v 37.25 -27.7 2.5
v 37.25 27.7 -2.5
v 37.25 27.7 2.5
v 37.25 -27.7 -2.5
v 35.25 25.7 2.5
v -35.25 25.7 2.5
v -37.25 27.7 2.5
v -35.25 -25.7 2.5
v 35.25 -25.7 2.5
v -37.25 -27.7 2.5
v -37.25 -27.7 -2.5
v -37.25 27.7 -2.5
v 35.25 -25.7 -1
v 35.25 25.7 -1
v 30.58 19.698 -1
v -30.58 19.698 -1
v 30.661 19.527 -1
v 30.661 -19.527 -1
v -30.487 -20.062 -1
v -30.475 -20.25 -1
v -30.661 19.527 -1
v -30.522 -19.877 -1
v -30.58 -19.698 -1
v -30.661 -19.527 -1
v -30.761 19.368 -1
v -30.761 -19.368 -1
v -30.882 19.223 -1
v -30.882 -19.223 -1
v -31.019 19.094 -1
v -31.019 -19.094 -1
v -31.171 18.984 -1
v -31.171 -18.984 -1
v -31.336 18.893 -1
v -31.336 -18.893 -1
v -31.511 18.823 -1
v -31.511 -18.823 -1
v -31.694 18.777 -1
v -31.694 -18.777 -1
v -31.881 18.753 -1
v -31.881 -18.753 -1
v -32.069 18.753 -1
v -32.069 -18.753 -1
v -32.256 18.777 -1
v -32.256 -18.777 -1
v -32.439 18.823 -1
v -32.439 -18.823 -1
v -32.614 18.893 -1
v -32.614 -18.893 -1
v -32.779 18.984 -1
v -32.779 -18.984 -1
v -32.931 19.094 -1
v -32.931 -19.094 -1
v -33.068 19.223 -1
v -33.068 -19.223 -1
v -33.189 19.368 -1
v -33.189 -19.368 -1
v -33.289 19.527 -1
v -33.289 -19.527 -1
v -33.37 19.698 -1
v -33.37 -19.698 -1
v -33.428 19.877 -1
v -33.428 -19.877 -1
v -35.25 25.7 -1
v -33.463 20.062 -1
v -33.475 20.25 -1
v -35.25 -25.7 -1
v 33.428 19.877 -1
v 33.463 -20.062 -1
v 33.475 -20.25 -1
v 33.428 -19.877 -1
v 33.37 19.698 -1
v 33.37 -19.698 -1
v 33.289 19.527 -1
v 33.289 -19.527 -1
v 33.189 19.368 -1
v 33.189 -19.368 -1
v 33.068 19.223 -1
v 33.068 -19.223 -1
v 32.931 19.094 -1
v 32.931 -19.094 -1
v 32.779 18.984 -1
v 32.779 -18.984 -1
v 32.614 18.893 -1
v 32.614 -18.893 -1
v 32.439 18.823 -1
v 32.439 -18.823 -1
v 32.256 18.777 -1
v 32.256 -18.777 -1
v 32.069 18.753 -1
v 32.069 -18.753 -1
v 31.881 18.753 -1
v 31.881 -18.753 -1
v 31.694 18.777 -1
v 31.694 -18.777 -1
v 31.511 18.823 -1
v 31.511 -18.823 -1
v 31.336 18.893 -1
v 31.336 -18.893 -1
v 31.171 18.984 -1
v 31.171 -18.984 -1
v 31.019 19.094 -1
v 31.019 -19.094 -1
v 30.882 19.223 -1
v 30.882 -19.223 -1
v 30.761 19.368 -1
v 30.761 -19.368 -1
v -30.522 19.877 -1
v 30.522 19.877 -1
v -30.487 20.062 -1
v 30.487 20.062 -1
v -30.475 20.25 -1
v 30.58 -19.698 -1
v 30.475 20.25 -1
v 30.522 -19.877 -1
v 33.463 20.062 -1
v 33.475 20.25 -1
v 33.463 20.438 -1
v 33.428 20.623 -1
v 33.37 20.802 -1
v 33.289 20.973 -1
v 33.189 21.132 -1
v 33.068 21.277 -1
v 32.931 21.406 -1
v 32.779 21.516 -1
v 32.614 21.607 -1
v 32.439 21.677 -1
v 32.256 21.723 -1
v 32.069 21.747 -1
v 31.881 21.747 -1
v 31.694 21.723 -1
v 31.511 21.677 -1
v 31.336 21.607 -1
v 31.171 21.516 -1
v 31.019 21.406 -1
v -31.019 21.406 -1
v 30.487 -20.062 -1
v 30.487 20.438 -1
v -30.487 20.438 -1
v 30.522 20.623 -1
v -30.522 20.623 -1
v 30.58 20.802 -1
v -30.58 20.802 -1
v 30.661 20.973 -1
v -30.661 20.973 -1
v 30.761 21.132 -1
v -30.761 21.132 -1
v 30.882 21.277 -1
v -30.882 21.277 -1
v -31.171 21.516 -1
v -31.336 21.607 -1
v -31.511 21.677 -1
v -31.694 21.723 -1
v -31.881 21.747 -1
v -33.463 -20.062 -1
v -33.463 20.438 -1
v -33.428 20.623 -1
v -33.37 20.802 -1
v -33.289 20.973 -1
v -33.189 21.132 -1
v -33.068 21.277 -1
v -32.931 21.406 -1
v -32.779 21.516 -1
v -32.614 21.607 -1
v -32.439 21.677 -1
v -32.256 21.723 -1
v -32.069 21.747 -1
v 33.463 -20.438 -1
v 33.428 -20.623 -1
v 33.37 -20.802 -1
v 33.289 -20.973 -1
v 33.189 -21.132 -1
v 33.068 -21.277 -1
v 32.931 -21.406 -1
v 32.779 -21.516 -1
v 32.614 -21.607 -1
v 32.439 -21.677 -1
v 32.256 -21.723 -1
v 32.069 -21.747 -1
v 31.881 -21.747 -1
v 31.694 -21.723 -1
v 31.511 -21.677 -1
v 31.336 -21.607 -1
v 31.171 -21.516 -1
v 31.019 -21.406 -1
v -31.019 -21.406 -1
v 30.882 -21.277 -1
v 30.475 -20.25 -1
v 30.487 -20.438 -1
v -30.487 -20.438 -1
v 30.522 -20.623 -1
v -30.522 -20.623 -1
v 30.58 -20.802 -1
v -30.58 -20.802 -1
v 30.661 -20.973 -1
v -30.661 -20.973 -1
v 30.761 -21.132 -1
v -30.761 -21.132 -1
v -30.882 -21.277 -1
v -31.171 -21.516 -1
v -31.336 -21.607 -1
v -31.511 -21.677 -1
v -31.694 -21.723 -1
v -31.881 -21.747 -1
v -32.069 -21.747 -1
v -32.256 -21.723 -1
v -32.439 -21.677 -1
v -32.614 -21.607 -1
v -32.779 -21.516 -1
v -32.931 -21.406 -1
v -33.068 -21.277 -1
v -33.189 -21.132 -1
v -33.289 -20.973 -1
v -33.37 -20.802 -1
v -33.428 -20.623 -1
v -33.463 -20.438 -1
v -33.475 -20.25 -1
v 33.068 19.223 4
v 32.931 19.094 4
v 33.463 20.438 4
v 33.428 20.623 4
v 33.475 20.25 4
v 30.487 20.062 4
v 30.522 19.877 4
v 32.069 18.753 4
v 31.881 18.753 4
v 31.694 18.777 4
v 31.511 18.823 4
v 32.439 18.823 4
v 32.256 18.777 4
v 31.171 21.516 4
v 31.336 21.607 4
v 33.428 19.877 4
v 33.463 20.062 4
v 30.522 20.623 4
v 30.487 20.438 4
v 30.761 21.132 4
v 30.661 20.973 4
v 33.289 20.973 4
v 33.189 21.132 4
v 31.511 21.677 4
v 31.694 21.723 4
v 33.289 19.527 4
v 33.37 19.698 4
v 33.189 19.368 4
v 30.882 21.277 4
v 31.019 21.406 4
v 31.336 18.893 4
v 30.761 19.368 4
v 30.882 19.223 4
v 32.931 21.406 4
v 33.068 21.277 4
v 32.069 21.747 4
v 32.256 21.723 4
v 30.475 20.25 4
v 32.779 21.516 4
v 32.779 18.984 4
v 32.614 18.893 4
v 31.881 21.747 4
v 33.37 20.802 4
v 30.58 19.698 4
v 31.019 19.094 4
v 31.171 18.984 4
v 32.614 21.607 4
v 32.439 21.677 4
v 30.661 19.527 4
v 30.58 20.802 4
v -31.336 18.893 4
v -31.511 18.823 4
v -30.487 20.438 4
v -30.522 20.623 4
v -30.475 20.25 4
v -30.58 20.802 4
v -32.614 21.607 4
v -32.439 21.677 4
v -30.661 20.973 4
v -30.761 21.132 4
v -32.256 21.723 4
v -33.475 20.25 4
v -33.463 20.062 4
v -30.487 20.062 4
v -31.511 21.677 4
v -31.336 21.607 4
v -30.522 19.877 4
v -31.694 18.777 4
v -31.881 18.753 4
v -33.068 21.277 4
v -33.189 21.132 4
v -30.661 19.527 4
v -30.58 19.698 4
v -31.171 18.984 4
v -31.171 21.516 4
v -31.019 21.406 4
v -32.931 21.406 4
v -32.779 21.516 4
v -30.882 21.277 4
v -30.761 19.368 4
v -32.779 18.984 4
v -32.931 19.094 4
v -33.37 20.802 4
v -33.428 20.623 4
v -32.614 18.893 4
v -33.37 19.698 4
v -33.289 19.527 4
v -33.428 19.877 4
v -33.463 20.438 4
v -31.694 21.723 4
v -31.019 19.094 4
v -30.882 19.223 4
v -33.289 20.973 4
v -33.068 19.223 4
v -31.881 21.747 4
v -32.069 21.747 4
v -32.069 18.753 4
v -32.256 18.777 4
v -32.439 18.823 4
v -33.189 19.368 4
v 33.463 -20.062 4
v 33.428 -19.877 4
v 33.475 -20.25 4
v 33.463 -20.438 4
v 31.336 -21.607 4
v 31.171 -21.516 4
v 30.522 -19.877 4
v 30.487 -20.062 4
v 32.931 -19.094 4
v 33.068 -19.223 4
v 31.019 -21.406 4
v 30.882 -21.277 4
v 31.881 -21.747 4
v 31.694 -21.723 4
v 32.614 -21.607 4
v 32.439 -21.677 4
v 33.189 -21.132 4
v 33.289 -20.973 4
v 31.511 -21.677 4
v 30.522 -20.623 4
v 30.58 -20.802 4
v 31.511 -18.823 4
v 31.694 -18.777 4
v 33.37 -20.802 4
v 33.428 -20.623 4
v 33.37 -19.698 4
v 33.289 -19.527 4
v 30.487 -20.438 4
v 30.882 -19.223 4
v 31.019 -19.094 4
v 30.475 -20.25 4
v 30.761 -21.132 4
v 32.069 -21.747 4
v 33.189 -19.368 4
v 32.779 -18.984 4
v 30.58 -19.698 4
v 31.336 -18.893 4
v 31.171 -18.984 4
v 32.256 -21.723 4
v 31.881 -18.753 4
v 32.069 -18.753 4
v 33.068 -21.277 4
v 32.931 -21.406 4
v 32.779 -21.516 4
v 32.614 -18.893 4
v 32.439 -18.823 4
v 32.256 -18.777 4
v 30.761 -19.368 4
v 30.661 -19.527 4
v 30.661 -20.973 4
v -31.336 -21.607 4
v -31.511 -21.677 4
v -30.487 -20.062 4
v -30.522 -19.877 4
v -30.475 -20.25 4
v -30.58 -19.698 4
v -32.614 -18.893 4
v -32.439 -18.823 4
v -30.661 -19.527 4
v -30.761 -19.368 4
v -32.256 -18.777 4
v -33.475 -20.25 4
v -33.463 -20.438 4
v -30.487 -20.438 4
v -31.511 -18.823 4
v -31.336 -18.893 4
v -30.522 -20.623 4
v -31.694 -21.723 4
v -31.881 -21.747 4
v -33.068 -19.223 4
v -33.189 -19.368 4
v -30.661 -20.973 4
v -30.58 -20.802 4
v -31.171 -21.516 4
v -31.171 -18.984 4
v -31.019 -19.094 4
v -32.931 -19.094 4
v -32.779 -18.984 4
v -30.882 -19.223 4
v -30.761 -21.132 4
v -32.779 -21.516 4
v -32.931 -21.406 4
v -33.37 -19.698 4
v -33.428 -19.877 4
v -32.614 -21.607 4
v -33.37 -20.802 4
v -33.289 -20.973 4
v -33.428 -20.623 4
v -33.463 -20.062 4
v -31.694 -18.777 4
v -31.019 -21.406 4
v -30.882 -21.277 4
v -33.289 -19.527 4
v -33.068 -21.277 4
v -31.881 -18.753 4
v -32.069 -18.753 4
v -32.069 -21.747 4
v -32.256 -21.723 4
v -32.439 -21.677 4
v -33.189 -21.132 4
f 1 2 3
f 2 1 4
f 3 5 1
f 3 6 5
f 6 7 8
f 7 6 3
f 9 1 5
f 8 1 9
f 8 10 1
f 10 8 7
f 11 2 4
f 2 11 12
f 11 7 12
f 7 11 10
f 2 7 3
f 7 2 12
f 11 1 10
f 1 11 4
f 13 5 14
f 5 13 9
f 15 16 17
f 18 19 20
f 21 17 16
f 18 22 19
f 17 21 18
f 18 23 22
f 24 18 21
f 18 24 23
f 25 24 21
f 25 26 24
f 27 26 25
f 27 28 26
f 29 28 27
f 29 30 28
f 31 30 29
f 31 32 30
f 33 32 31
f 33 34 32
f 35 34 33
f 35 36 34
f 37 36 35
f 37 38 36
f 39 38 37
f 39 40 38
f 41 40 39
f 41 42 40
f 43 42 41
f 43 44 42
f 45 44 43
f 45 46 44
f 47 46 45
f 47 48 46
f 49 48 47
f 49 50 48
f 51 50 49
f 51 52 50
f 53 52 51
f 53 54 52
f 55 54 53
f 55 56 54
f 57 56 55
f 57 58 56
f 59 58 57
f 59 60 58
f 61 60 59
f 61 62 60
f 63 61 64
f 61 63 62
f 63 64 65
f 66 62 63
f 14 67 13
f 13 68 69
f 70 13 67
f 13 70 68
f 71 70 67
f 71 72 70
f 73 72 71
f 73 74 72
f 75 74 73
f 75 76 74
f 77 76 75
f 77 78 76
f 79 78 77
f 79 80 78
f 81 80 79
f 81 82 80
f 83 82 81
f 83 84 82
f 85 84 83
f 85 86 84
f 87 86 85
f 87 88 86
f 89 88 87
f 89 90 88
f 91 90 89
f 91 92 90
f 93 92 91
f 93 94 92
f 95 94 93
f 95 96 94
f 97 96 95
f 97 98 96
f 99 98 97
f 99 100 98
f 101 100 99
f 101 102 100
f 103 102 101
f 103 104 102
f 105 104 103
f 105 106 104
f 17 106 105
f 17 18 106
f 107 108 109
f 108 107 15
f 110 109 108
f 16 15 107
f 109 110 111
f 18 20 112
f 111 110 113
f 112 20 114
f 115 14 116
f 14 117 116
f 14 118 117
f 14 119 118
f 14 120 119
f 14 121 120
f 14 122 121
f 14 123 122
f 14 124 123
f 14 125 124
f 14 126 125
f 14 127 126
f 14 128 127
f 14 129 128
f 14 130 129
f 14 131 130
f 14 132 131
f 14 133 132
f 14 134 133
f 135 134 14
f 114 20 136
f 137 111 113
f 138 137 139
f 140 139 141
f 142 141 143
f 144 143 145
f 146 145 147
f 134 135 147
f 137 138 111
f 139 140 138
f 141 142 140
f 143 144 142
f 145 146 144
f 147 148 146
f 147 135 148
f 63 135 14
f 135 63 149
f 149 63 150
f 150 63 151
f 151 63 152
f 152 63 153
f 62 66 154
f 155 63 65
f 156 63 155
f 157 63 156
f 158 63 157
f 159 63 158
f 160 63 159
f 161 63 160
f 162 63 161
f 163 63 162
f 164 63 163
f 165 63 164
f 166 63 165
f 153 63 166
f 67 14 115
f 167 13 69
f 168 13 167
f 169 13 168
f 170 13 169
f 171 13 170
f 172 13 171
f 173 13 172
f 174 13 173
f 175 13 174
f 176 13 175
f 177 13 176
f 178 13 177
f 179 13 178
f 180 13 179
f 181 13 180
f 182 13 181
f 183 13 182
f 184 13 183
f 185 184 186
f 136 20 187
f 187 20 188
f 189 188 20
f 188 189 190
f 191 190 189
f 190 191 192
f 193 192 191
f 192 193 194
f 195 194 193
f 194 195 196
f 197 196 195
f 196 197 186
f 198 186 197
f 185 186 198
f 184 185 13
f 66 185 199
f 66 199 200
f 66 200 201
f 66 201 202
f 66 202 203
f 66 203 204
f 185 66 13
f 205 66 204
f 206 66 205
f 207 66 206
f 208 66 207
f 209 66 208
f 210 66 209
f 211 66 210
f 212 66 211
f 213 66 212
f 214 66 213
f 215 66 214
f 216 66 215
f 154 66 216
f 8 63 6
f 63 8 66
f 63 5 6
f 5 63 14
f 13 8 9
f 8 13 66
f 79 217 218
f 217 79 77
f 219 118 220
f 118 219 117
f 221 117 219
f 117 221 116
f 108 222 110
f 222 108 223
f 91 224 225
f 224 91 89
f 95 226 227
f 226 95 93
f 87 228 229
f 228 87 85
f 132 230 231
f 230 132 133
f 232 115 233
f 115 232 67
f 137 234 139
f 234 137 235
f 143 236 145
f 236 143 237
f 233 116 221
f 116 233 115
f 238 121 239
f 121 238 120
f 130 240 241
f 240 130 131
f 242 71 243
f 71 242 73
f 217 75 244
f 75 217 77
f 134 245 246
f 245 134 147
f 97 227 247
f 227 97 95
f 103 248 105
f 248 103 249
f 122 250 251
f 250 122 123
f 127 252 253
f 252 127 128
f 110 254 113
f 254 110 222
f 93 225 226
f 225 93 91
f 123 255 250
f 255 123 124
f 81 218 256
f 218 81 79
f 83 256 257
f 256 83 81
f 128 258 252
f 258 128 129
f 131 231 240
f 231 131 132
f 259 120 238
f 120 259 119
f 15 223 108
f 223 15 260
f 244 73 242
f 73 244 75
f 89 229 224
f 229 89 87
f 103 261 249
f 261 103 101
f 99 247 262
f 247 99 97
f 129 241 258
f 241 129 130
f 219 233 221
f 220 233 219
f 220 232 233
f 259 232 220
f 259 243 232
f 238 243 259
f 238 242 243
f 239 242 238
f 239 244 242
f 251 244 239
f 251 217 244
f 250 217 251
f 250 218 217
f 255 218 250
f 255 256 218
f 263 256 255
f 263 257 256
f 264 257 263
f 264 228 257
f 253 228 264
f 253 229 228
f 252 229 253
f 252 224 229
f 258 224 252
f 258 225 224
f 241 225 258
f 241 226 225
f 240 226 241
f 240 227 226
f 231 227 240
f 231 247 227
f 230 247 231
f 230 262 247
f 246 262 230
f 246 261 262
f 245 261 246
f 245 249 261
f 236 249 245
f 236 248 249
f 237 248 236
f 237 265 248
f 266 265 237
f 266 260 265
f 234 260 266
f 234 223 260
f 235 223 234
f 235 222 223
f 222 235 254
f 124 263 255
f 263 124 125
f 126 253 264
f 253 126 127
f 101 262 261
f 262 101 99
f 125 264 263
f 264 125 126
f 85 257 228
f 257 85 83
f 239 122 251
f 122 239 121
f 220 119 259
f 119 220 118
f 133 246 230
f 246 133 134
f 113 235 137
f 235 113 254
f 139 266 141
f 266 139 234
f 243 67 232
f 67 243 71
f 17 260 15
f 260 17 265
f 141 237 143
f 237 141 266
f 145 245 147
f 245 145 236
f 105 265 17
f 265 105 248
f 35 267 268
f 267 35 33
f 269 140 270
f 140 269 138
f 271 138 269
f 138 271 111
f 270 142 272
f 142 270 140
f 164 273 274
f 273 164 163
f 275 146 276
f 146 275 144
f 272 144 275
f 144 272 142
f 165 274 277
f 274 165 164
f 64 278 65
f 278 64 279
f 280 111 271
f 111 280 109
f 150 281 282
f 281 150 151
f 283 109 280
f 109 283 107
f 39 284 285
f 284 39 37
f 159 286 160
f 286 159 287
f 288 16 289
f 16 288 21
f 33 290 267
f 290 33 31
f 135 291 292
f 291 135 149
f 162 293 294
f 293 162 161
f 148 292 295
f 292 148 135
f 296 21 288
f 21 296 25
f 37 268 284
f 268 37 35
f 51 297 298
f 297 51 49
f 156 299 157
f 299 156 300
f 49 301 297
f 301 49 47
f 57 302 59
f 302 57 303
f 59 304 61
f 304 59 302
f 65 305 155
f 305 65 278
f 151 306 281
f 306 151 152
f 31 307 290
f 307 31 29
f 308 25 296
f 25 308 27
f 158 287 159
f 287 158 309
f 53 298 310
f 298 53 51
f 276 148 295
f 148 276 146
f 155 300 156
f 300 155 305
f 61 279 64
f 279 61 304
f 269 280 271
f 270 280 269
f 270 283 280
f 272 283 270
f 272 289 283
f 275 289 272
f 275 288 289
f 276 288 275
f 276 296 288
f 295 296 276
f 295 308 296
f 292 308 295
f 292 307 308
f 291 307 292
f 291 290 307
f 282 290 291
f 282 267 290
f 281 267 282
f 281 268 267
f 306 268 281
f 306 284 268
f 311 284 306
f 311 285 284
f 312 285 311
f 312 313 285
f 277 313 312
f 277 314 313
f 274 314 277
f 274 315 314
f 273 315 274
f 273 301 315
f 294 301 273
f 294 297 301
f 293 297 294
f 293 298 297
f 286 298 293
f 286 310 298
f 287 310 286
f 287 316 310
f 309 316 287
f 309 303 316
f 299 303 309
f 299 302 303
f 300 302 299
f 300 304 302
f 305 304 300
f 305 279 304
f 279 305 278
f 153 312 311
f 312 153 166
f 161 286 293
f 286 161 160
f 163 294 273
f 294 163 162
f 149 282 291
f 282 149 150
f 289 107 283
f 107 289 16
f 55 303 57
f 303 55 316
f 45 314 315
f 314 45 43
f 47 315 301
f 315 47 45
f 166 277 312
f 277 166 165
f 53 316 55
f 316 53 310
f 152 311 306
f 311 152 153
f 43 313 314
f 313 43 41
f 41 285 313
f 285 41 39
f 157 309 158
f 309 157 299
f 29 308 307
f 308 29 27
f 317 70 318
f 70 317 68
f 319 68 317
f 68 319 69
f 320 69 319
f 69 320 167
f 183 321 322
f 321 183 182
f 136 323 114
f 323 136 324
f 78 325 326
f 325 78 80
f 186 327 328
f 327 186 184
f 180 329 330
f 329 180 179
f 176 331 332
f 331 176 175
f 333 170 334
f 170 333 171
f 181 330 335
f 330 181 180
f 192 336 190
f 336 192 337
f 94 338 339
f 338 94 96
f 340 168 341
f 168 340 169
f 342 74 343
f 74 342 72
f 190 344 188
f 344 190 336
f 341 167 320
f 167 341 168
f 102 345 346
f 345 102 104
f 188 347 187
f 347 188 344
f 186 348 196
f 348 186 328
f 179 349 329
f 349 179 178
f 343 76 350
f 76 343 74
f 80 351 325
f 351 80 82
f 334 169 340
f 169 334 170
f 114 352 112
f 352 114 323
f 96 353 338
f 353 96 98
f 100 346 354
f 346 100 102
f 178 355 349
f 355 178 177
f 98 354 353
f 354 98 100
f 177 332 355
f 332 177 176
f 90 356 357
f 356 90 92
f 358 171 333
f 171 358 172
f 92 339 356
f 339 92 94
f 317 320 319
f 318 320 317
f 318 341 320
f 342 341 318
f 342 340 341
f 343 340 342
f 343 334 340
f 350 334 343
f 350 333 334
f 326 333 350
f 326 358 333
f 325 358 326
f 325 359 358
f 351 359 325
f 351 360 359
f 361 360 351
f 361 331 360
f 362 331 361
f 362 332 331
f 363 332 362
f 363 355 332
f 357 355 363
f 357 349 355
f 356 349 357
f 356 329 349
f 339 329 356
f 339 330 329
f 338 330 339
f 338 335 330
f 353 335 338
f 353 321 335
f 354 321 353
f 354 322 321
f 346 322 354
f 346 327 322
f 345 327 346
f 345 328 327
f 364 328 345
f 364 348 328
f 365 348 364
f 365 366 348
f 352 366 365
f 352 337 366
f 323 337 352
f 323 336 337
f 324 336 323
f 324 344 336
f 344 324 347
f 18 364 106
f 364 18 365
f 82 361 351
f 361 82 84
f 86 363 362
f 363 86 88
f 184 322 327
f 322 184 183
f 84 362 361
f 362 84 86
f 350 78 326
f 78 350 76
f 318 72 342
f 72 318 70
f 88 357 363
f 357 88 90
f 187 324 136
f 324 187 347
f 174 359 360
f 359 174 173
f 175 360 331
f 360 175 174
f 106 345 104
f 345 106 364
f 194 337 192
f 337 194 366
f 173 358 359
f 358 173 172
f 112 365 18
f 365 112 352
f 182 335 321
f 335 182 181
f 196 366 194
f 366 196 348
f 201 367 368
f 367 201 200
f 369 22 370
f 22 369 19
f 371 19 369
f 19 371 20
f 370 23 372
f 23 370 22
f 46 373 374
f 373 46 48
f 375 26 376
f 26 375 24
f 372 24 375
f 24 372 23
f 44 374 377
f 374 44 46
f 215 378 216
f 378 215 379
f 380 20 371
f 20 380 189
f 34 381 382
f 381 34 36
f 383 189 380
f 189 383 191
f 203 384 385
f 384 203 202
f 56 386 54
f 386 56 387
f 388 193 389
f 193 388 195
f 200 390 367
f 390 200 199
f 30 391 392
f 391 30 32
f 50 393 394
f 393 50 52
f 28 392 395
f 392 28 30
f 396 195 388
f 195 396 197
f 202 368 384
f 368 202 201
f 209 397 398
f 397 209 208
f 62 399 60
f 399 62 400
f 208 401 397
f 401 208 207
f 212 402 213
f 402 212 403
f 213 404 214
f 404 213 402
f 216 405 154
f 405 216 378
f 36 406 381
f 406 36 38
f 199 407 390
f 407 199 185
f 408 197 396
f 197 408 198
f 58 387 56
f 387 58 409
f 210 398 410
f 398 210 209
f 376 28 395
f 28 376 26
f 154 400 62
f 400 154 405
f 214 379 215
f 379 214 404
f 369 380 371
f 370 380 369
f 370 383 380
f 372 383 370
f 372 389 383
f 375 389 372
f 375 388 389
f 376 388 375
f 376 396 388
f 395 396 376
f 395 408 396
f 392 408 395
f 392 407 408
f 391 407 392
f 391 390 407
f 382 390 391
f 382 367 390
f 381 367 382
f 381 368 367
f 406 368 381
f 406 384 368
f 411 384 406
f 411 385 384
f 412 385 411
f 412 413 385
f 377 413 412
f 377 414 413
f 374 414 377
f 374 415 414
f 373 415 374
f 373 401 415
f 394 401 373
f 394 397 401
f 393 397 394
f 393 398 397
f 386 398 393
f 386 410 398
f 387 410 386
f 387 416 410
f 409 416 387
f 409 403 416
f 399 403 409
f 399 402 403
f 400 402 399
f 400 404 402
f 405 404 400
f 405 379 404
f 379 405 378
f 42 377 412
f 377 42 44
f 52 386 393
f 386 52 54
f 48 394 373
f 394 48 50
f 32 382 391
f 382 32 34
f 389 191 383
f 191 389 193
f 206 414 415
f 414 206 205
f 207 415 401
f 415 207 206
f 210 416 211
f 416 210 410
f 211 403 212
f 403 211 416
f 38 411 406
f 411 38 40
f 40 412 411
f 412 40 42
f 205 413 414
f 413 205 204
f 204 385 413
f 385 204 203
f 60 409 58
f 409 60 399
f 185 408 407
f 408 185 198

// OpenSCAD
//****************************************************************
//*  Name    : Generic Coaster                                   *
//*  Author  : Robert Joseph Korn                                *
//*  Notice  : Copyright (c) 2015 Open Valley Consulting Corp    *
//*          : All Rights Reserved                               *
//*  Date    : 5/27/15                                           *
//*  Version : 1.0                                               *
//*  Notes   : Simple Circuit Board Coaster                      *
//*          :                                                   *
//****************************************************************


$fn=50;

wallT = 2;

boardW = 70.5;
boardH = 51.4;
boardD = 3;

holeW = 63.95;
holeH = 40.5;

pinD = 3;
pinL = 4;

outerW = boardW + 2*wallT;
outerH = boardH + 2*wallT;
outerD = boardD + wallT;

union(){
	difference() {
		cube([outerW, outerH, outerD],center=true);
		translate([0, 0, wallT/2]) cube([boardW, boardH, boardD+1],center=true);
	}

	translate([holeW/2, holeH/2, -wallT]) cylinder(h=wallT+pinL,d=pinD);
	translate([-holeW/2, holeH/2, -wallT]) cylinder(h=wallT+pinL,d=pinD);
	translate([holeW/2, -holeH/2, -wallT]) cylinder(h=wallT+pinL,d=pinD);
	translate([-holeW/2, -holeH/2, -wallT]) cylinder(h=wallT+pinL,d=pinD);
}
